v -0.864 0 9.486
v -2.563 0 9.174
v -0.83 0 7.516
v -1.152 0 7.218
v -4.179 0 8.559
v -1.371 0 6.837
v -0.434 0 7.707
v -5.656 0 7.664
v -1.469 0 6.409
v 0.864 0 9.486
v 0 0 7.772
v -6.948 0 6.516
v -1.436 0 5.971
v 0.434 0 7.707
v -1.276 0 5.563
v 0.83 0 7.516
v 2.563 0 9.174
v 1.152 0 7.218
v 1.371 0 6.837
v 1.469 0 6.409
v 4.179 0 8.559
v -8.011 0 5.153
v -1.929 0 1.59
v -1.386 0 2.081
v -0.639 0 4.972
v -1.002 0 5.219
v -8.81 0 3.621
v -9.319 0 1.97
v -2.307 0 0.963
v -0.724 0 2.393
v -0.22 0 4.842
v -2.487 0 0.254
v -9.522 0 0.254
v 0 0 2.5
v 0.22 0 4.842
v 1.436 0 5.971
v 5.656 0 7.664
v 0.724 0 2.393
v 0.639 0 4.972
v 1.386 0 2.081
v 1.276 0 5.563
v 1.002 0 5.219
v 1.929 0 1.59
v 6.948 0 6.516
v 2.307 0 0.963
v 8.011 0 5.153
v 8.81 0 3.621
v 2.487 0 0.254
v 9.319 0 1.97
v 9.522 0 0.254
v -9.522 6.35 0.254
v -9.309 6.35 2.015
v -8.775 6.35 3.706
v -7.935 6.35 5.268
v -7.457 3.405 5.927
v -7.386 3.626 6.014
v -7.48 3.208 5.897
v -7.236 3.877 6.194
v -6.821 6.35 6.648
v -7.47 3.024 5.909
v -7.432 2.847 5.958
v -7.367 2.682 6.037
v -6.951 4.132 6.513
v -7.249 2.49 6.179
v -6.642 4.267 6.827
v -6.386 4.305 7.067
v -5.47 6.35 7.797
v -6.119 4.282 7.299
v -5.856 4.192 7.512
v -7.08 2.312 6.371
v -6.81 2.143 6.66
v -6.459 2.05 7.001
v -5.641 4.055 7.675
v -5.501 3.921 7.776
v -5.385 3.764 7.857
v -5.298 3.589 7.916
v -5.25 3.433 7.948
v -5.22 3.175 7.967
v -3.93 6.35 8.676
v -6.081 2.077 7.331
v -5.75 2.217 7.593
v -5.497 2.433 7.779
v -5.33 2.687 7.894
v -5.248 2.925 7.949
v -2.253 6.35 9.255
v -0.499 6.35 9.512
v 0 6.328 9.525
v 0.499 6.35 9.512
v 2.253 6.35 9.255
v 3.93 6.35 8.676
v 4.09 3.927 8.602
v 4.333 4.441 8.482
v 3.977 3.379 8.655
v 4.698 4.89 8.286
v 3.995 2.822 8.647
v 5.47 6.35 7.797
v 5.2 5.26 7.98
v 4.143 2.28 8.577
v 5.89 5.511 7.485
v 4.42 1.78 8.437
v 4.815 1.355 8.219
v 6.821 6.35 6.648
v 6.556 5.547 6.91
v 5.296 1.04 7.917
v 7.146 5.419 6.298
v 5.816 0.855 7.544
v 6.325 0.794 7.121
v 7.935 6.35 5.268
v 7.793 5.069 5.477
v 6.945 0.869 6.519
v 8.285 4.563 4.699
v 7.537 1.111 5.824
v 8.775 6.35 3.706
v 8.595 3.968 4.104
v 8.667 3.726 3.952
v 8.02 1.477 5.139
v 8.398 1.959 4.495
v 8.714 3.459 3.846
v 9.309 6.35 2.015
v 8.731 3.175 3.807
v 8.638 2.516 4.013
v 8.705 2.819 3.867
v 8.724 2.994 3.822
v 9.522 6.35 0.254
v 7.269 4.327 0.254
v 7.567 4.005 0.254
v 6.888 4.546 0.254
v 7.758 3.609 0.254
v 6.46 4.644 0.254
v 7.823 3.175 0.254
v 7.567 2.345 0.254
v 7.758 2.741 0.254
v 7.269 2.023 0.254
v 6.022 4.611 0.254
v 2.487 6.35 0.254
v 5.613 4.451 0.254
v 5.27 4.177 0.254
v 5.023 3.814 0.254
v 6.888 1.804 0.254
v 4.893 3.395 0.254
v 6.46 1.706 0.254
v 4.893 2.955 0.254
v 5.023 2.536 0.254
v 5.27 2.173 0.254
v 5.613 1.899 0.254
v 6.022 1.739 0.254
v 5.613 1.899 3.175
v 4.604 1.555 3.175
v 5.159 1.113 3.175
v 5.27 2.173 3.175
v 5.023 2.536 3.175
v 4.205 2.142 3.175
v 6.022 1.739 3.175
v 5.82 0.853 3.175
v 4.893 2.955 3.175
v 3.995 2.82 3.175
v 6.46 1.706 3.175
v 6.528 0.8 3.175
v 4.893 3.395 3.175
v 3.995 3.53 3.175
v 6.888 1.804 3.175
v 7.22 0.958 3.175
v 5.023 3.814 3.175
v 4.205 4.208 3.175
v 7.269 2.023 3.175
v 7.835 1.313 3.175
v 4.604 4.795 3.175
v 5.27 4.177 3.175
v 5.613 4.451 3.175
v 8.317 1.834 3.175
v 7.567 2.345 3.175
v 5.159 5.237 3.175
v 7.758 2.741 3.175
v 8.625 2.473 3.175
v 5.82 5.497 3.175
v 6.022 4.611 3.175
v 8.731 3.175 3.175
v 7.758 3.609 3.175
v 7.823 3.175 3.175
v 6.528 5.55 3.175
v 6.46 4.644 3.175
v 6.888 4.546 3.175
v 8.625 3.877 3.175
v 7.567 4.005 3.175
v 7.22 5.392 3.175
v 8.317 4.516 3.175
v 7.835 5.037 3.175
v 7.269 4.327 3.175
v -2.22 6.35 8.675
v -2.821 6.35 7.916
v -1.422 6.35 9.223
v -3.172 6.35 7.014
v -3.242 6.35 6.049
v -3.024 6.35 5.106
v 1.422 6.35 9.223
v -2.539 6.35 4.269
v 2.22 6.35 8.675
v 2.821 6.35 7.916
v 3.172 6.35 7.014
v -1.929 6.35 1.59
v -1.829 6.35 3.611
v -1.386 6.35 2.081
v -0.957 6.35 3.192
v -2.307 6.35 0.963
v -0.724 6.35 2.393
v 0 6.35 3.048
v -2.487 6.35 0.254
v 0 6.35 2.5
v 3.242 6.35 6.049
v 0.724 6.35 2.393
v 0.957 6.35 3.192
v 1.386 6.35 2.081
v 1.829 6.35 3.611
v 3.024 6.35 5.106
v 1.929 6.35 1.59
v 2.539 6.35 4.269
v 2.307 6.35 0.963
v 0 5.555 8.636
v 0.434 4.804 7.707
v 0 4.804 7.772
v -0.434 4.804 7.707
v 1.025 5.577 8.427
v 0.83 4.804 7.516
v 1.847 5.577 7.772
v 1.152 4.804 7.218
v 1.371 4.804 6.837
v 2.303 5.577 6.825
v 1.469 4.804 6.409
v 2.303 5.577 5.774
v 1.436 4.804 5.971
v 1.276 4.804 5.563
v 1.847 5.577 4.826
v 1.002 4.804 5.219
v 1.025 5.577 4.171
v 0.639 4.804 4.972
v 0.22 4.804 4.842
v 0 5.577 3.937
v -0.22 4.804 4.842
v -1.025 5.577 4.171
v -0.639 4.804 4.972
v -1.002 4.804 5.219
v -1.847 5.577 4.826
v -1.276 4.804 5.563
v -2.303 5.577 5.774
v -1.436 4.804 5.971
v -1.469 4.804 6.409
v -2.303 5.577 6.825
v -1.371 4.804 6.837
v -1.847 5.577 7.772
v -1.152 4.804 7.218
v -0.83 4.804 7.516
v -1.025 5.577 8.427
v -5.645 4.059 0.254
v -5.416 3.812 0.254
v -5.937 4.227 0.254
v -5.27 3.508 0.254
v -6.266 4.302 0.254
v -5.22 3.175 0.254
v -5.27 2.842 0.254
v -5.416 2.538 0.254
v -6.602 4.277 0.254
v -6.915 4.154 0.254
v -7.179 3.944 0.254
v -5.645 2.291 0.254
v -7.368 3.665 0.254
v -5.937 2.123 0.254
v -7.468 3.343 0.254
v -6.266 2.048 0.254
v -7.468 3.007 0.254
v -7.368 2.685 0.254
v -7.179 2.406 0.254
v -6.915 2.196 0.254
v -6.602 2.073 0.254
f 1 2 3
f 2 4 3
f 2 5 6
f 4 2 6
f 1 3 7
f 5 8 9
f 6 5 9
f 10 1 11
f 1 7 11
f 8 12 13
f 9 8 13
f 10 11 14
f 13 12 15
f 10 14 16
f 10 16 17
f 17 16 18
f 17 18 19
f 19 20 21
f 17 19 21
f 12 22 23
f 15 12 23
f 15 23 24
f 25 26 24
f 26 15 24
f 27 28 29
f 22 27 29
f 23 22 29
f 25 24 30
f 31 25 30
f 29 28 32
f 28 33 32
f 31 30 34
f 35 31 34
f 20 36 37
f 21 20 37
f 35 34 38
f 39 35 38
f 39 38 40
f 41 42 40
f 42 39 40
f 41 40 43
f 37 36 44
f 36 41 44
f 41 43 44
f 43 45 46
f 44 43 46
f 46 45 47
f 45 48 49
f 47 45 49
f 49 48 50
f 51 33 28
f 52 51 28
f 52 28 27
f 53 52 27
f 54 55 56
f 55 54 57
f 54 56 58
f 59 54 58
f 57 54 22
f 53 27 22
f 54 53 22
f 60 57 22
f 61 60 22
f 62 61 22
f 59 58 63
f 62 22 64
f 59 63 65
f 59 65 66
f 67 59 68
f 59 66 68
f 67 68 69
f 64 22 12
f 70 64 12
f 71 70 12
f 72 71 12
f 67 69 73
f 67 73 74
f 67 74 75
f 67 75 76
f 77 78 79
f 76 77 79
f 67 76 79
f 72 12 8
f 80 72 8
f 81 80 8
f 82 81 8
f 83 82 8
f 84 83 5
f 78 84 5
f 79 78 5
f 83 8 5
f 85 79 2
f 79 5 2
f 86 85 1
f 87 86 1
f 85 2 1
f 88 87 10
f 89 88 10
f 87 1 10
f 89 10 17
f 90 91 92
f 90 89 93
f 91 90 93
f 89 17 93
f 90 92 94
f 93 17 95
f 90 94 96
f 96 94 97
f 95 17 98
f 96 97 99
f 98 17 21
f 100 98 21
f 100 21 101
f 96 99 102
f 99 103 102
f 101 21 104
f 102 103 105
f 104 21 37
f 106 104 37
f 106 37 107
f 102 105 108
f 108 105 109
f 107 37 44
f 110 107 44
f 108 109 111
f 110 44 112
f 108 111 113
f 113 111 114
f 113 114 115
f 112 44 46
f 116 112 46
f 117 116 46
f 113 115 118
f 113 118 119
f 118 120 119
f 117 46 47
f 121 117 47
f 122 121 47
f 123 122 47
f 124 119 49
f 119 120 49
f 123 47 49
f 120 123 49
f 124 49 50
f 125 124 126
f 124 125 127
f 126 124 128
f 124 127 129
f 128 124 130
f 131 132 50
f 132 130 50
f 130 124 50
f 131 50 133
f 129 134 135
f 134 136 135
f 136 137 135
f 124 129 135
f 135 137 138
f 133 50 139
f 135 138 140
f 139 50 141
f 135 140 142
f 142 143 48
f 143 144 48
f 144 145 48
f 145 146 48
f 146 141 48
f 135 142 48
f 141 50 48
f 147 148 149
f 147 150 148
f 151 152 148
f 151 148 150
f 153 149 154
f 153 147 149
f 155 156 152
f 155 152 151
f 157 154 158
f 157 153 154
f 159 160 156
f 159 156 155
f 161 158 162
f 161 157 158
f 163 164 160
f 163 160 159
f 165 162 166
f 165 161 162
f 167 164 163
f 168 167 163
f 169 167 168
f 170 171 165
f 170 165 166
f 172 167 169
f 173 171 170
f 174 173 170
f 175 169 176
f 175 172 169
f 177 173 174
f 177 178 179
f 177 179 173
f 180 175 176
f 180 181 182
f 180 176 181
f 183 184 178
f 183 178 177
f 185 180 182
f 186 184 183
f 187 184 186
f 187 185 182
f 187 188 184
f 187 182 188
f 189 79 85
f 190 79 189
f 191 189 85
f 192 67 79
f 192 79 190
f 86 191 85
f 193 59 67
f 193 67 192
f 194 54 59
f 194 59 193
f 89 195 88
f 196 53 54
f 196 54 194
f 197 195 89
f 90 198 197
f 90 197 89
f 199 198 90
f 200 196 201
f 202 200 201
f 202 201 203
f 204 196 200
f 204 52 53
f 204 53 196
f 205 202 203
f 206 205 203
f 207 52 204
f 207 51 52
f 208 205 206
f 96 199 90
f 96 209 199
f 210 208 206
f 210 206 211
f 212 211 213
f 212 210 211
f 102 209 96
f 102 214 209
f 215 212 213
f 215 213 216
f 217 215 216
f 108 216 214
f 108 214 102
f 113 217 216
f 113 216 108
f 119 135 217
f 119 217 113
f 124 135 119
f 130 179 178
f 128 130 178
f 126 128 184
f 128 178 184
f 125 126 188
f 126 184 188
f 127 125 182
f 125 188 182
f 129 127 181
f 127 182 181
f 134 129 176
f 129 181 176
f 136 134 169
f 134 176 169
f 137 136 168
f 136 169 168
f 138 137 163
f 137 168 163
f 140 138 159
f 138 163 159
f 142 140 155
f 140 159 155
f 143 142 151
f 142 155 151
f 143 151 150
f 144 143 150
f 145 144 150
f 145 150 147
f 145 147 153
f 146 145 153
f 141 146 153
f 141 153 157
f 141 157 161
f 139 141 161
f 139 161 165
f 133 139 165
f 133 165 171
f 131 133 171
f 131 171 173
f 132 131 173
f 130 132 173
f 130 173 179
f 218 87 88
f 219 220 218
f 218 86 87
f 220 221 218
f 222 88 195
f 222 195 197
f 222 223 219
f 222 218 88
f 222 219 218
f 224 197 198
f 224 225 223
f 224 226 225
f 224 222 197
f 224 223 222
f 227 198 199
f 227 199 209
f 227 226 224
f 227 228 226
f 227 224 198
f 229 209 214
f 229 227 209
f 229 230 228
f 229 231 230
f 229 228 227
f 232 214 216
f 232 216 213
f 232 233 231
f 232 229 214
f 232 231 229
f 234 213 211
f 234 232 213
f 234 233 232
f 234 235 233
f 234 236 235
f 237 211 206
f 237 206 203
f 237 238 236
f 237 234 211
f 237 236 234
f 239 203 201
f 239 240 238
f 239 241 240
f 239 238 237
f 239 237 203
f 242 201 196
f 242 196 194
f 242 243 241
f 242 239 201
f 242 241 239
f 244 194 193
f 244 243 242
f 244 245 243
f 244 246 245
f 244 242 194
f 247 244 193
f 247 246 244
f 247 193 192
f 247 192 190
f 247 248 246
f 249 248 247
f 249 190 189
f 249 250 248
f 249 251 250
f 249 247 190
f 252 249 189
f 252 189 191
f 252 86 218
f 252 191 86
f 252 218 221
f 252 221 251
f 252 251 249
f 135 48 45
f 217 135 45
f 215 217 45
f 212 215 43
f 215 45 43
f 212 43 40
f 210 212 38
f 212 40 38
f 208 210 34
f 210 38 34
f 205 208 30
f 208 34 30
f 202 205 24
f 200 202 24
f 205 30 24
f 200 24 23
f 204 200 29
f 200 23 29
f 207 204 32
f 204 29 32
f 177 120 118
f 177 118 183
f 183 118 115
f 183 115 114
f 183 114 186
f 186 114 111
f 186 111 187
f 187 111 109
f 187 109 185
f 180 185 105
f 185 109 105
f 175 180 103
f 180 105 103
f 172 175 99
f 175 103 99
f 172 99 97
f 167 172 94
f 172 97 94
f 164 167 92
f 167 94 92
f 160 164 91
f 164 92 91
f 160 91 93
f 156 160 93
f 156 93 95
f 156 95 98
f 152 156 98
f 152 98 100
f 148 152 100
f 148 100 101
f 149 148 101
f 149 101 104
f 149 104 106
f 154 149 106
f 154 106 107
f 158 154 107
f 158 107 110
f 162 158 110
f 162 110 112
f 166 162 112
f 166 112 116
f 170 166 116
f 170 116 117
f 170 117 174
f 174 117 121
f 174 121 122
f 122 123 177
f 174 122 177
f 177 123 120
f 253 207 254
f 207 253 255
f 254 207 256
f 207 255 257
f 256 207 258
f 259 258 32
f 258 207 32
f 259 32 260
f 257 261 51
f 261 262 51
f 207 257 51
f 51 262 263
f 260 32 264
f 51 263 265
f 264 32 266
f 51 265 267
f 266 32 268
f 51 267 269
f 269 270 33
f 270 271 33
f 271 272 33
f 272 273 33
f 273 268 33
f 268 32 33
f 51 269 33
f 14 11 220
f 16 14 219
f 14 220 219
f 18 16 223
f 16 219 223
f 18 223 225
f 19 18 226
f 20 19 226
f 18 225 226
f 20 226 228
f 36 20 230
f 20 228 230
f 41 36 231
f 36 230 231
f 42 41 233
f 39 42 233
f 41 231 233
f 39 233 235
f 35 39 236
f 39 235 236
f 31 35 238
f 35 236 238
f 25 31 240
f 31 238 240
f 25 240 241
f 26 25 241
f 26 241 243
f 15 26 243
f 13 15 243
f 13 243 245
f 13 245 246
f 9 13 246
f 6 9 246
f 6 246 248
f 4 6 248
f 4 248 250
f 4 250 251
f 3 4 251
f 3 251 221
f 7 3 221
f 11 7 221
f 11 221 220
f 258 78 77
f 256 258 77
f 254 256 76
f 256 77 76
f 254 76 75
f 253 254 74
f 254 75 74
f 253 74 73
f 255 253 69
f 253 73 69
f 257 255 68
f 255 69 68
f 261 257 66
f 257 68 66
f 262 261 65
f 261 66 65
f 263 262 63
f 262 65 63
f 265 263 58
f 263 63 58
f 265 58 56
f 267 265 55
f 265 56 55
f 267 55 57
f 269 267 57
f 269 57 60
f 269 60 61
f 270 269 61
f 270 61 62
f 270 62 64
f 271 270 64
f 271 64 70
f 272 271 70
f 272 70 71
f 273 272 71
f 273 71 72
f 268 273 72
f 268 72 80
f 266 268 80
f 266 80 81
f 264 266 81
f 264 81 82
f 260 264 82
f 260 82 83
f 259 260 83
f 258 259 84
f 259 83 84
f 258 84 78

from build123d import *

# Parameters (mm, degrees)
BOSS_EXTRUDE1_DEPTH   = 6.35
F_4_40_TAPPED_HOLE1_D = 2.2606
SKETCH8_R             = 2.38125
CUT_EXTRUDE1_DEPTH    = 6.35
SKETCH9_R             = 1.4732
CUT_EXTRUDE2_DEPTH    = 14.088396137
SKETCH10_R            = 1.4732
CUT_EXTRUDE3_DEPTH    = 15.889903931
CHAMFER1_SIZE         = 1.778
CHAMFER1_SIZE_2       = 1.54559182


with BuildPart() as part:
    # Sketch1 → Boss-Extrude1 (new body)
    with BuildSketch(Plane(origin=(0, 0, 0), x_dir=(1, 0, 0), z_dir=(0, 1, 0))):
        with BuildLine():
            Line((-2.487063329, -0.254), (-9.521612731, -0.254))
            ThreePointArc((-9.521612731, -0.254), (0, -9.525), (9.521612731, -0.254))
            Line((9.521612731, -0.254), (2.487063329, -0.254))
            ThreePointArc((2.487063329, -0.254), (0, -2.5), (-2.487063329, -0.254))
        make_face()
    extrude(amount=BOSS_EXTRUDE1_DEPTH)

    # #4-40 Tapped Hole1 (through all)
    with Locations(Plane(origin=(0, 0, 0.254), x_dir=(-1, 0, 0), z_dir=(0, 0, -1))):
        with Locations((6.35, 3.175)):
            Hole(F_4_40_TAPPED_HOLE1_D / 2)

    # Sketch8 → Cut-Extrude1 (cut)
    with BuildSketch(Plane.XY.offset(9.525)):
        with Locations((6.35, 3.175)):
            Circle(SKETCH8_R)
    extrude(amount=-CUT_EXTRUDE1_DEPTH, mode=Mode.SUBTRACT)

    # Sketch9 → Cut-Extrude2 (cut, through all)
    with BuildSketch(Plane.XY.offset(3.175)):
        with Locations((6.35, 3.175)):
            Circle(SKETCH9_R)
    extrude(amount=-CUT_EXTRUDE2_DEPTH, mode=Mode.SUBTRACT)

    # Sketch10 → Cut-Extrude3 (cut, through all)
    with BuildSketch(Plane(origin=(0, 6.35, 0), x_dir=(1, 0, 0), z_dir=(0, 1, 0))):
        with Locations(Location((0, -6.2992, 0), (0, 0, 270))):
            Circle(SKETCH10_R)
    extrude(amount=-CUT_EXTRUDE3_DEPTH, mode=Mode.SUBTRACT)

    # Chamfer1
    # the kernel refuses this chamfer: 1.778, 1.54559182 mm, written as the material it takes off along each edge
    with BuildSketch(Plane(origin=(0, 6.35, 6.2992), x_dir=(0, 0, 1), z_dir=(-1, 0, 0))) as chamfer1_piece_1:
        Polygon((1.4732 + CHAMFER1_SIZE, 0), (1.4732, -CHAMFER1_SIZE_2), (1.4732, 0), align=None)
    revolve(axis=Axis((0, 6.35, 6.2992), (0, 1, 0)), mode=Mode.SUBTRACT)


solid = part.part
